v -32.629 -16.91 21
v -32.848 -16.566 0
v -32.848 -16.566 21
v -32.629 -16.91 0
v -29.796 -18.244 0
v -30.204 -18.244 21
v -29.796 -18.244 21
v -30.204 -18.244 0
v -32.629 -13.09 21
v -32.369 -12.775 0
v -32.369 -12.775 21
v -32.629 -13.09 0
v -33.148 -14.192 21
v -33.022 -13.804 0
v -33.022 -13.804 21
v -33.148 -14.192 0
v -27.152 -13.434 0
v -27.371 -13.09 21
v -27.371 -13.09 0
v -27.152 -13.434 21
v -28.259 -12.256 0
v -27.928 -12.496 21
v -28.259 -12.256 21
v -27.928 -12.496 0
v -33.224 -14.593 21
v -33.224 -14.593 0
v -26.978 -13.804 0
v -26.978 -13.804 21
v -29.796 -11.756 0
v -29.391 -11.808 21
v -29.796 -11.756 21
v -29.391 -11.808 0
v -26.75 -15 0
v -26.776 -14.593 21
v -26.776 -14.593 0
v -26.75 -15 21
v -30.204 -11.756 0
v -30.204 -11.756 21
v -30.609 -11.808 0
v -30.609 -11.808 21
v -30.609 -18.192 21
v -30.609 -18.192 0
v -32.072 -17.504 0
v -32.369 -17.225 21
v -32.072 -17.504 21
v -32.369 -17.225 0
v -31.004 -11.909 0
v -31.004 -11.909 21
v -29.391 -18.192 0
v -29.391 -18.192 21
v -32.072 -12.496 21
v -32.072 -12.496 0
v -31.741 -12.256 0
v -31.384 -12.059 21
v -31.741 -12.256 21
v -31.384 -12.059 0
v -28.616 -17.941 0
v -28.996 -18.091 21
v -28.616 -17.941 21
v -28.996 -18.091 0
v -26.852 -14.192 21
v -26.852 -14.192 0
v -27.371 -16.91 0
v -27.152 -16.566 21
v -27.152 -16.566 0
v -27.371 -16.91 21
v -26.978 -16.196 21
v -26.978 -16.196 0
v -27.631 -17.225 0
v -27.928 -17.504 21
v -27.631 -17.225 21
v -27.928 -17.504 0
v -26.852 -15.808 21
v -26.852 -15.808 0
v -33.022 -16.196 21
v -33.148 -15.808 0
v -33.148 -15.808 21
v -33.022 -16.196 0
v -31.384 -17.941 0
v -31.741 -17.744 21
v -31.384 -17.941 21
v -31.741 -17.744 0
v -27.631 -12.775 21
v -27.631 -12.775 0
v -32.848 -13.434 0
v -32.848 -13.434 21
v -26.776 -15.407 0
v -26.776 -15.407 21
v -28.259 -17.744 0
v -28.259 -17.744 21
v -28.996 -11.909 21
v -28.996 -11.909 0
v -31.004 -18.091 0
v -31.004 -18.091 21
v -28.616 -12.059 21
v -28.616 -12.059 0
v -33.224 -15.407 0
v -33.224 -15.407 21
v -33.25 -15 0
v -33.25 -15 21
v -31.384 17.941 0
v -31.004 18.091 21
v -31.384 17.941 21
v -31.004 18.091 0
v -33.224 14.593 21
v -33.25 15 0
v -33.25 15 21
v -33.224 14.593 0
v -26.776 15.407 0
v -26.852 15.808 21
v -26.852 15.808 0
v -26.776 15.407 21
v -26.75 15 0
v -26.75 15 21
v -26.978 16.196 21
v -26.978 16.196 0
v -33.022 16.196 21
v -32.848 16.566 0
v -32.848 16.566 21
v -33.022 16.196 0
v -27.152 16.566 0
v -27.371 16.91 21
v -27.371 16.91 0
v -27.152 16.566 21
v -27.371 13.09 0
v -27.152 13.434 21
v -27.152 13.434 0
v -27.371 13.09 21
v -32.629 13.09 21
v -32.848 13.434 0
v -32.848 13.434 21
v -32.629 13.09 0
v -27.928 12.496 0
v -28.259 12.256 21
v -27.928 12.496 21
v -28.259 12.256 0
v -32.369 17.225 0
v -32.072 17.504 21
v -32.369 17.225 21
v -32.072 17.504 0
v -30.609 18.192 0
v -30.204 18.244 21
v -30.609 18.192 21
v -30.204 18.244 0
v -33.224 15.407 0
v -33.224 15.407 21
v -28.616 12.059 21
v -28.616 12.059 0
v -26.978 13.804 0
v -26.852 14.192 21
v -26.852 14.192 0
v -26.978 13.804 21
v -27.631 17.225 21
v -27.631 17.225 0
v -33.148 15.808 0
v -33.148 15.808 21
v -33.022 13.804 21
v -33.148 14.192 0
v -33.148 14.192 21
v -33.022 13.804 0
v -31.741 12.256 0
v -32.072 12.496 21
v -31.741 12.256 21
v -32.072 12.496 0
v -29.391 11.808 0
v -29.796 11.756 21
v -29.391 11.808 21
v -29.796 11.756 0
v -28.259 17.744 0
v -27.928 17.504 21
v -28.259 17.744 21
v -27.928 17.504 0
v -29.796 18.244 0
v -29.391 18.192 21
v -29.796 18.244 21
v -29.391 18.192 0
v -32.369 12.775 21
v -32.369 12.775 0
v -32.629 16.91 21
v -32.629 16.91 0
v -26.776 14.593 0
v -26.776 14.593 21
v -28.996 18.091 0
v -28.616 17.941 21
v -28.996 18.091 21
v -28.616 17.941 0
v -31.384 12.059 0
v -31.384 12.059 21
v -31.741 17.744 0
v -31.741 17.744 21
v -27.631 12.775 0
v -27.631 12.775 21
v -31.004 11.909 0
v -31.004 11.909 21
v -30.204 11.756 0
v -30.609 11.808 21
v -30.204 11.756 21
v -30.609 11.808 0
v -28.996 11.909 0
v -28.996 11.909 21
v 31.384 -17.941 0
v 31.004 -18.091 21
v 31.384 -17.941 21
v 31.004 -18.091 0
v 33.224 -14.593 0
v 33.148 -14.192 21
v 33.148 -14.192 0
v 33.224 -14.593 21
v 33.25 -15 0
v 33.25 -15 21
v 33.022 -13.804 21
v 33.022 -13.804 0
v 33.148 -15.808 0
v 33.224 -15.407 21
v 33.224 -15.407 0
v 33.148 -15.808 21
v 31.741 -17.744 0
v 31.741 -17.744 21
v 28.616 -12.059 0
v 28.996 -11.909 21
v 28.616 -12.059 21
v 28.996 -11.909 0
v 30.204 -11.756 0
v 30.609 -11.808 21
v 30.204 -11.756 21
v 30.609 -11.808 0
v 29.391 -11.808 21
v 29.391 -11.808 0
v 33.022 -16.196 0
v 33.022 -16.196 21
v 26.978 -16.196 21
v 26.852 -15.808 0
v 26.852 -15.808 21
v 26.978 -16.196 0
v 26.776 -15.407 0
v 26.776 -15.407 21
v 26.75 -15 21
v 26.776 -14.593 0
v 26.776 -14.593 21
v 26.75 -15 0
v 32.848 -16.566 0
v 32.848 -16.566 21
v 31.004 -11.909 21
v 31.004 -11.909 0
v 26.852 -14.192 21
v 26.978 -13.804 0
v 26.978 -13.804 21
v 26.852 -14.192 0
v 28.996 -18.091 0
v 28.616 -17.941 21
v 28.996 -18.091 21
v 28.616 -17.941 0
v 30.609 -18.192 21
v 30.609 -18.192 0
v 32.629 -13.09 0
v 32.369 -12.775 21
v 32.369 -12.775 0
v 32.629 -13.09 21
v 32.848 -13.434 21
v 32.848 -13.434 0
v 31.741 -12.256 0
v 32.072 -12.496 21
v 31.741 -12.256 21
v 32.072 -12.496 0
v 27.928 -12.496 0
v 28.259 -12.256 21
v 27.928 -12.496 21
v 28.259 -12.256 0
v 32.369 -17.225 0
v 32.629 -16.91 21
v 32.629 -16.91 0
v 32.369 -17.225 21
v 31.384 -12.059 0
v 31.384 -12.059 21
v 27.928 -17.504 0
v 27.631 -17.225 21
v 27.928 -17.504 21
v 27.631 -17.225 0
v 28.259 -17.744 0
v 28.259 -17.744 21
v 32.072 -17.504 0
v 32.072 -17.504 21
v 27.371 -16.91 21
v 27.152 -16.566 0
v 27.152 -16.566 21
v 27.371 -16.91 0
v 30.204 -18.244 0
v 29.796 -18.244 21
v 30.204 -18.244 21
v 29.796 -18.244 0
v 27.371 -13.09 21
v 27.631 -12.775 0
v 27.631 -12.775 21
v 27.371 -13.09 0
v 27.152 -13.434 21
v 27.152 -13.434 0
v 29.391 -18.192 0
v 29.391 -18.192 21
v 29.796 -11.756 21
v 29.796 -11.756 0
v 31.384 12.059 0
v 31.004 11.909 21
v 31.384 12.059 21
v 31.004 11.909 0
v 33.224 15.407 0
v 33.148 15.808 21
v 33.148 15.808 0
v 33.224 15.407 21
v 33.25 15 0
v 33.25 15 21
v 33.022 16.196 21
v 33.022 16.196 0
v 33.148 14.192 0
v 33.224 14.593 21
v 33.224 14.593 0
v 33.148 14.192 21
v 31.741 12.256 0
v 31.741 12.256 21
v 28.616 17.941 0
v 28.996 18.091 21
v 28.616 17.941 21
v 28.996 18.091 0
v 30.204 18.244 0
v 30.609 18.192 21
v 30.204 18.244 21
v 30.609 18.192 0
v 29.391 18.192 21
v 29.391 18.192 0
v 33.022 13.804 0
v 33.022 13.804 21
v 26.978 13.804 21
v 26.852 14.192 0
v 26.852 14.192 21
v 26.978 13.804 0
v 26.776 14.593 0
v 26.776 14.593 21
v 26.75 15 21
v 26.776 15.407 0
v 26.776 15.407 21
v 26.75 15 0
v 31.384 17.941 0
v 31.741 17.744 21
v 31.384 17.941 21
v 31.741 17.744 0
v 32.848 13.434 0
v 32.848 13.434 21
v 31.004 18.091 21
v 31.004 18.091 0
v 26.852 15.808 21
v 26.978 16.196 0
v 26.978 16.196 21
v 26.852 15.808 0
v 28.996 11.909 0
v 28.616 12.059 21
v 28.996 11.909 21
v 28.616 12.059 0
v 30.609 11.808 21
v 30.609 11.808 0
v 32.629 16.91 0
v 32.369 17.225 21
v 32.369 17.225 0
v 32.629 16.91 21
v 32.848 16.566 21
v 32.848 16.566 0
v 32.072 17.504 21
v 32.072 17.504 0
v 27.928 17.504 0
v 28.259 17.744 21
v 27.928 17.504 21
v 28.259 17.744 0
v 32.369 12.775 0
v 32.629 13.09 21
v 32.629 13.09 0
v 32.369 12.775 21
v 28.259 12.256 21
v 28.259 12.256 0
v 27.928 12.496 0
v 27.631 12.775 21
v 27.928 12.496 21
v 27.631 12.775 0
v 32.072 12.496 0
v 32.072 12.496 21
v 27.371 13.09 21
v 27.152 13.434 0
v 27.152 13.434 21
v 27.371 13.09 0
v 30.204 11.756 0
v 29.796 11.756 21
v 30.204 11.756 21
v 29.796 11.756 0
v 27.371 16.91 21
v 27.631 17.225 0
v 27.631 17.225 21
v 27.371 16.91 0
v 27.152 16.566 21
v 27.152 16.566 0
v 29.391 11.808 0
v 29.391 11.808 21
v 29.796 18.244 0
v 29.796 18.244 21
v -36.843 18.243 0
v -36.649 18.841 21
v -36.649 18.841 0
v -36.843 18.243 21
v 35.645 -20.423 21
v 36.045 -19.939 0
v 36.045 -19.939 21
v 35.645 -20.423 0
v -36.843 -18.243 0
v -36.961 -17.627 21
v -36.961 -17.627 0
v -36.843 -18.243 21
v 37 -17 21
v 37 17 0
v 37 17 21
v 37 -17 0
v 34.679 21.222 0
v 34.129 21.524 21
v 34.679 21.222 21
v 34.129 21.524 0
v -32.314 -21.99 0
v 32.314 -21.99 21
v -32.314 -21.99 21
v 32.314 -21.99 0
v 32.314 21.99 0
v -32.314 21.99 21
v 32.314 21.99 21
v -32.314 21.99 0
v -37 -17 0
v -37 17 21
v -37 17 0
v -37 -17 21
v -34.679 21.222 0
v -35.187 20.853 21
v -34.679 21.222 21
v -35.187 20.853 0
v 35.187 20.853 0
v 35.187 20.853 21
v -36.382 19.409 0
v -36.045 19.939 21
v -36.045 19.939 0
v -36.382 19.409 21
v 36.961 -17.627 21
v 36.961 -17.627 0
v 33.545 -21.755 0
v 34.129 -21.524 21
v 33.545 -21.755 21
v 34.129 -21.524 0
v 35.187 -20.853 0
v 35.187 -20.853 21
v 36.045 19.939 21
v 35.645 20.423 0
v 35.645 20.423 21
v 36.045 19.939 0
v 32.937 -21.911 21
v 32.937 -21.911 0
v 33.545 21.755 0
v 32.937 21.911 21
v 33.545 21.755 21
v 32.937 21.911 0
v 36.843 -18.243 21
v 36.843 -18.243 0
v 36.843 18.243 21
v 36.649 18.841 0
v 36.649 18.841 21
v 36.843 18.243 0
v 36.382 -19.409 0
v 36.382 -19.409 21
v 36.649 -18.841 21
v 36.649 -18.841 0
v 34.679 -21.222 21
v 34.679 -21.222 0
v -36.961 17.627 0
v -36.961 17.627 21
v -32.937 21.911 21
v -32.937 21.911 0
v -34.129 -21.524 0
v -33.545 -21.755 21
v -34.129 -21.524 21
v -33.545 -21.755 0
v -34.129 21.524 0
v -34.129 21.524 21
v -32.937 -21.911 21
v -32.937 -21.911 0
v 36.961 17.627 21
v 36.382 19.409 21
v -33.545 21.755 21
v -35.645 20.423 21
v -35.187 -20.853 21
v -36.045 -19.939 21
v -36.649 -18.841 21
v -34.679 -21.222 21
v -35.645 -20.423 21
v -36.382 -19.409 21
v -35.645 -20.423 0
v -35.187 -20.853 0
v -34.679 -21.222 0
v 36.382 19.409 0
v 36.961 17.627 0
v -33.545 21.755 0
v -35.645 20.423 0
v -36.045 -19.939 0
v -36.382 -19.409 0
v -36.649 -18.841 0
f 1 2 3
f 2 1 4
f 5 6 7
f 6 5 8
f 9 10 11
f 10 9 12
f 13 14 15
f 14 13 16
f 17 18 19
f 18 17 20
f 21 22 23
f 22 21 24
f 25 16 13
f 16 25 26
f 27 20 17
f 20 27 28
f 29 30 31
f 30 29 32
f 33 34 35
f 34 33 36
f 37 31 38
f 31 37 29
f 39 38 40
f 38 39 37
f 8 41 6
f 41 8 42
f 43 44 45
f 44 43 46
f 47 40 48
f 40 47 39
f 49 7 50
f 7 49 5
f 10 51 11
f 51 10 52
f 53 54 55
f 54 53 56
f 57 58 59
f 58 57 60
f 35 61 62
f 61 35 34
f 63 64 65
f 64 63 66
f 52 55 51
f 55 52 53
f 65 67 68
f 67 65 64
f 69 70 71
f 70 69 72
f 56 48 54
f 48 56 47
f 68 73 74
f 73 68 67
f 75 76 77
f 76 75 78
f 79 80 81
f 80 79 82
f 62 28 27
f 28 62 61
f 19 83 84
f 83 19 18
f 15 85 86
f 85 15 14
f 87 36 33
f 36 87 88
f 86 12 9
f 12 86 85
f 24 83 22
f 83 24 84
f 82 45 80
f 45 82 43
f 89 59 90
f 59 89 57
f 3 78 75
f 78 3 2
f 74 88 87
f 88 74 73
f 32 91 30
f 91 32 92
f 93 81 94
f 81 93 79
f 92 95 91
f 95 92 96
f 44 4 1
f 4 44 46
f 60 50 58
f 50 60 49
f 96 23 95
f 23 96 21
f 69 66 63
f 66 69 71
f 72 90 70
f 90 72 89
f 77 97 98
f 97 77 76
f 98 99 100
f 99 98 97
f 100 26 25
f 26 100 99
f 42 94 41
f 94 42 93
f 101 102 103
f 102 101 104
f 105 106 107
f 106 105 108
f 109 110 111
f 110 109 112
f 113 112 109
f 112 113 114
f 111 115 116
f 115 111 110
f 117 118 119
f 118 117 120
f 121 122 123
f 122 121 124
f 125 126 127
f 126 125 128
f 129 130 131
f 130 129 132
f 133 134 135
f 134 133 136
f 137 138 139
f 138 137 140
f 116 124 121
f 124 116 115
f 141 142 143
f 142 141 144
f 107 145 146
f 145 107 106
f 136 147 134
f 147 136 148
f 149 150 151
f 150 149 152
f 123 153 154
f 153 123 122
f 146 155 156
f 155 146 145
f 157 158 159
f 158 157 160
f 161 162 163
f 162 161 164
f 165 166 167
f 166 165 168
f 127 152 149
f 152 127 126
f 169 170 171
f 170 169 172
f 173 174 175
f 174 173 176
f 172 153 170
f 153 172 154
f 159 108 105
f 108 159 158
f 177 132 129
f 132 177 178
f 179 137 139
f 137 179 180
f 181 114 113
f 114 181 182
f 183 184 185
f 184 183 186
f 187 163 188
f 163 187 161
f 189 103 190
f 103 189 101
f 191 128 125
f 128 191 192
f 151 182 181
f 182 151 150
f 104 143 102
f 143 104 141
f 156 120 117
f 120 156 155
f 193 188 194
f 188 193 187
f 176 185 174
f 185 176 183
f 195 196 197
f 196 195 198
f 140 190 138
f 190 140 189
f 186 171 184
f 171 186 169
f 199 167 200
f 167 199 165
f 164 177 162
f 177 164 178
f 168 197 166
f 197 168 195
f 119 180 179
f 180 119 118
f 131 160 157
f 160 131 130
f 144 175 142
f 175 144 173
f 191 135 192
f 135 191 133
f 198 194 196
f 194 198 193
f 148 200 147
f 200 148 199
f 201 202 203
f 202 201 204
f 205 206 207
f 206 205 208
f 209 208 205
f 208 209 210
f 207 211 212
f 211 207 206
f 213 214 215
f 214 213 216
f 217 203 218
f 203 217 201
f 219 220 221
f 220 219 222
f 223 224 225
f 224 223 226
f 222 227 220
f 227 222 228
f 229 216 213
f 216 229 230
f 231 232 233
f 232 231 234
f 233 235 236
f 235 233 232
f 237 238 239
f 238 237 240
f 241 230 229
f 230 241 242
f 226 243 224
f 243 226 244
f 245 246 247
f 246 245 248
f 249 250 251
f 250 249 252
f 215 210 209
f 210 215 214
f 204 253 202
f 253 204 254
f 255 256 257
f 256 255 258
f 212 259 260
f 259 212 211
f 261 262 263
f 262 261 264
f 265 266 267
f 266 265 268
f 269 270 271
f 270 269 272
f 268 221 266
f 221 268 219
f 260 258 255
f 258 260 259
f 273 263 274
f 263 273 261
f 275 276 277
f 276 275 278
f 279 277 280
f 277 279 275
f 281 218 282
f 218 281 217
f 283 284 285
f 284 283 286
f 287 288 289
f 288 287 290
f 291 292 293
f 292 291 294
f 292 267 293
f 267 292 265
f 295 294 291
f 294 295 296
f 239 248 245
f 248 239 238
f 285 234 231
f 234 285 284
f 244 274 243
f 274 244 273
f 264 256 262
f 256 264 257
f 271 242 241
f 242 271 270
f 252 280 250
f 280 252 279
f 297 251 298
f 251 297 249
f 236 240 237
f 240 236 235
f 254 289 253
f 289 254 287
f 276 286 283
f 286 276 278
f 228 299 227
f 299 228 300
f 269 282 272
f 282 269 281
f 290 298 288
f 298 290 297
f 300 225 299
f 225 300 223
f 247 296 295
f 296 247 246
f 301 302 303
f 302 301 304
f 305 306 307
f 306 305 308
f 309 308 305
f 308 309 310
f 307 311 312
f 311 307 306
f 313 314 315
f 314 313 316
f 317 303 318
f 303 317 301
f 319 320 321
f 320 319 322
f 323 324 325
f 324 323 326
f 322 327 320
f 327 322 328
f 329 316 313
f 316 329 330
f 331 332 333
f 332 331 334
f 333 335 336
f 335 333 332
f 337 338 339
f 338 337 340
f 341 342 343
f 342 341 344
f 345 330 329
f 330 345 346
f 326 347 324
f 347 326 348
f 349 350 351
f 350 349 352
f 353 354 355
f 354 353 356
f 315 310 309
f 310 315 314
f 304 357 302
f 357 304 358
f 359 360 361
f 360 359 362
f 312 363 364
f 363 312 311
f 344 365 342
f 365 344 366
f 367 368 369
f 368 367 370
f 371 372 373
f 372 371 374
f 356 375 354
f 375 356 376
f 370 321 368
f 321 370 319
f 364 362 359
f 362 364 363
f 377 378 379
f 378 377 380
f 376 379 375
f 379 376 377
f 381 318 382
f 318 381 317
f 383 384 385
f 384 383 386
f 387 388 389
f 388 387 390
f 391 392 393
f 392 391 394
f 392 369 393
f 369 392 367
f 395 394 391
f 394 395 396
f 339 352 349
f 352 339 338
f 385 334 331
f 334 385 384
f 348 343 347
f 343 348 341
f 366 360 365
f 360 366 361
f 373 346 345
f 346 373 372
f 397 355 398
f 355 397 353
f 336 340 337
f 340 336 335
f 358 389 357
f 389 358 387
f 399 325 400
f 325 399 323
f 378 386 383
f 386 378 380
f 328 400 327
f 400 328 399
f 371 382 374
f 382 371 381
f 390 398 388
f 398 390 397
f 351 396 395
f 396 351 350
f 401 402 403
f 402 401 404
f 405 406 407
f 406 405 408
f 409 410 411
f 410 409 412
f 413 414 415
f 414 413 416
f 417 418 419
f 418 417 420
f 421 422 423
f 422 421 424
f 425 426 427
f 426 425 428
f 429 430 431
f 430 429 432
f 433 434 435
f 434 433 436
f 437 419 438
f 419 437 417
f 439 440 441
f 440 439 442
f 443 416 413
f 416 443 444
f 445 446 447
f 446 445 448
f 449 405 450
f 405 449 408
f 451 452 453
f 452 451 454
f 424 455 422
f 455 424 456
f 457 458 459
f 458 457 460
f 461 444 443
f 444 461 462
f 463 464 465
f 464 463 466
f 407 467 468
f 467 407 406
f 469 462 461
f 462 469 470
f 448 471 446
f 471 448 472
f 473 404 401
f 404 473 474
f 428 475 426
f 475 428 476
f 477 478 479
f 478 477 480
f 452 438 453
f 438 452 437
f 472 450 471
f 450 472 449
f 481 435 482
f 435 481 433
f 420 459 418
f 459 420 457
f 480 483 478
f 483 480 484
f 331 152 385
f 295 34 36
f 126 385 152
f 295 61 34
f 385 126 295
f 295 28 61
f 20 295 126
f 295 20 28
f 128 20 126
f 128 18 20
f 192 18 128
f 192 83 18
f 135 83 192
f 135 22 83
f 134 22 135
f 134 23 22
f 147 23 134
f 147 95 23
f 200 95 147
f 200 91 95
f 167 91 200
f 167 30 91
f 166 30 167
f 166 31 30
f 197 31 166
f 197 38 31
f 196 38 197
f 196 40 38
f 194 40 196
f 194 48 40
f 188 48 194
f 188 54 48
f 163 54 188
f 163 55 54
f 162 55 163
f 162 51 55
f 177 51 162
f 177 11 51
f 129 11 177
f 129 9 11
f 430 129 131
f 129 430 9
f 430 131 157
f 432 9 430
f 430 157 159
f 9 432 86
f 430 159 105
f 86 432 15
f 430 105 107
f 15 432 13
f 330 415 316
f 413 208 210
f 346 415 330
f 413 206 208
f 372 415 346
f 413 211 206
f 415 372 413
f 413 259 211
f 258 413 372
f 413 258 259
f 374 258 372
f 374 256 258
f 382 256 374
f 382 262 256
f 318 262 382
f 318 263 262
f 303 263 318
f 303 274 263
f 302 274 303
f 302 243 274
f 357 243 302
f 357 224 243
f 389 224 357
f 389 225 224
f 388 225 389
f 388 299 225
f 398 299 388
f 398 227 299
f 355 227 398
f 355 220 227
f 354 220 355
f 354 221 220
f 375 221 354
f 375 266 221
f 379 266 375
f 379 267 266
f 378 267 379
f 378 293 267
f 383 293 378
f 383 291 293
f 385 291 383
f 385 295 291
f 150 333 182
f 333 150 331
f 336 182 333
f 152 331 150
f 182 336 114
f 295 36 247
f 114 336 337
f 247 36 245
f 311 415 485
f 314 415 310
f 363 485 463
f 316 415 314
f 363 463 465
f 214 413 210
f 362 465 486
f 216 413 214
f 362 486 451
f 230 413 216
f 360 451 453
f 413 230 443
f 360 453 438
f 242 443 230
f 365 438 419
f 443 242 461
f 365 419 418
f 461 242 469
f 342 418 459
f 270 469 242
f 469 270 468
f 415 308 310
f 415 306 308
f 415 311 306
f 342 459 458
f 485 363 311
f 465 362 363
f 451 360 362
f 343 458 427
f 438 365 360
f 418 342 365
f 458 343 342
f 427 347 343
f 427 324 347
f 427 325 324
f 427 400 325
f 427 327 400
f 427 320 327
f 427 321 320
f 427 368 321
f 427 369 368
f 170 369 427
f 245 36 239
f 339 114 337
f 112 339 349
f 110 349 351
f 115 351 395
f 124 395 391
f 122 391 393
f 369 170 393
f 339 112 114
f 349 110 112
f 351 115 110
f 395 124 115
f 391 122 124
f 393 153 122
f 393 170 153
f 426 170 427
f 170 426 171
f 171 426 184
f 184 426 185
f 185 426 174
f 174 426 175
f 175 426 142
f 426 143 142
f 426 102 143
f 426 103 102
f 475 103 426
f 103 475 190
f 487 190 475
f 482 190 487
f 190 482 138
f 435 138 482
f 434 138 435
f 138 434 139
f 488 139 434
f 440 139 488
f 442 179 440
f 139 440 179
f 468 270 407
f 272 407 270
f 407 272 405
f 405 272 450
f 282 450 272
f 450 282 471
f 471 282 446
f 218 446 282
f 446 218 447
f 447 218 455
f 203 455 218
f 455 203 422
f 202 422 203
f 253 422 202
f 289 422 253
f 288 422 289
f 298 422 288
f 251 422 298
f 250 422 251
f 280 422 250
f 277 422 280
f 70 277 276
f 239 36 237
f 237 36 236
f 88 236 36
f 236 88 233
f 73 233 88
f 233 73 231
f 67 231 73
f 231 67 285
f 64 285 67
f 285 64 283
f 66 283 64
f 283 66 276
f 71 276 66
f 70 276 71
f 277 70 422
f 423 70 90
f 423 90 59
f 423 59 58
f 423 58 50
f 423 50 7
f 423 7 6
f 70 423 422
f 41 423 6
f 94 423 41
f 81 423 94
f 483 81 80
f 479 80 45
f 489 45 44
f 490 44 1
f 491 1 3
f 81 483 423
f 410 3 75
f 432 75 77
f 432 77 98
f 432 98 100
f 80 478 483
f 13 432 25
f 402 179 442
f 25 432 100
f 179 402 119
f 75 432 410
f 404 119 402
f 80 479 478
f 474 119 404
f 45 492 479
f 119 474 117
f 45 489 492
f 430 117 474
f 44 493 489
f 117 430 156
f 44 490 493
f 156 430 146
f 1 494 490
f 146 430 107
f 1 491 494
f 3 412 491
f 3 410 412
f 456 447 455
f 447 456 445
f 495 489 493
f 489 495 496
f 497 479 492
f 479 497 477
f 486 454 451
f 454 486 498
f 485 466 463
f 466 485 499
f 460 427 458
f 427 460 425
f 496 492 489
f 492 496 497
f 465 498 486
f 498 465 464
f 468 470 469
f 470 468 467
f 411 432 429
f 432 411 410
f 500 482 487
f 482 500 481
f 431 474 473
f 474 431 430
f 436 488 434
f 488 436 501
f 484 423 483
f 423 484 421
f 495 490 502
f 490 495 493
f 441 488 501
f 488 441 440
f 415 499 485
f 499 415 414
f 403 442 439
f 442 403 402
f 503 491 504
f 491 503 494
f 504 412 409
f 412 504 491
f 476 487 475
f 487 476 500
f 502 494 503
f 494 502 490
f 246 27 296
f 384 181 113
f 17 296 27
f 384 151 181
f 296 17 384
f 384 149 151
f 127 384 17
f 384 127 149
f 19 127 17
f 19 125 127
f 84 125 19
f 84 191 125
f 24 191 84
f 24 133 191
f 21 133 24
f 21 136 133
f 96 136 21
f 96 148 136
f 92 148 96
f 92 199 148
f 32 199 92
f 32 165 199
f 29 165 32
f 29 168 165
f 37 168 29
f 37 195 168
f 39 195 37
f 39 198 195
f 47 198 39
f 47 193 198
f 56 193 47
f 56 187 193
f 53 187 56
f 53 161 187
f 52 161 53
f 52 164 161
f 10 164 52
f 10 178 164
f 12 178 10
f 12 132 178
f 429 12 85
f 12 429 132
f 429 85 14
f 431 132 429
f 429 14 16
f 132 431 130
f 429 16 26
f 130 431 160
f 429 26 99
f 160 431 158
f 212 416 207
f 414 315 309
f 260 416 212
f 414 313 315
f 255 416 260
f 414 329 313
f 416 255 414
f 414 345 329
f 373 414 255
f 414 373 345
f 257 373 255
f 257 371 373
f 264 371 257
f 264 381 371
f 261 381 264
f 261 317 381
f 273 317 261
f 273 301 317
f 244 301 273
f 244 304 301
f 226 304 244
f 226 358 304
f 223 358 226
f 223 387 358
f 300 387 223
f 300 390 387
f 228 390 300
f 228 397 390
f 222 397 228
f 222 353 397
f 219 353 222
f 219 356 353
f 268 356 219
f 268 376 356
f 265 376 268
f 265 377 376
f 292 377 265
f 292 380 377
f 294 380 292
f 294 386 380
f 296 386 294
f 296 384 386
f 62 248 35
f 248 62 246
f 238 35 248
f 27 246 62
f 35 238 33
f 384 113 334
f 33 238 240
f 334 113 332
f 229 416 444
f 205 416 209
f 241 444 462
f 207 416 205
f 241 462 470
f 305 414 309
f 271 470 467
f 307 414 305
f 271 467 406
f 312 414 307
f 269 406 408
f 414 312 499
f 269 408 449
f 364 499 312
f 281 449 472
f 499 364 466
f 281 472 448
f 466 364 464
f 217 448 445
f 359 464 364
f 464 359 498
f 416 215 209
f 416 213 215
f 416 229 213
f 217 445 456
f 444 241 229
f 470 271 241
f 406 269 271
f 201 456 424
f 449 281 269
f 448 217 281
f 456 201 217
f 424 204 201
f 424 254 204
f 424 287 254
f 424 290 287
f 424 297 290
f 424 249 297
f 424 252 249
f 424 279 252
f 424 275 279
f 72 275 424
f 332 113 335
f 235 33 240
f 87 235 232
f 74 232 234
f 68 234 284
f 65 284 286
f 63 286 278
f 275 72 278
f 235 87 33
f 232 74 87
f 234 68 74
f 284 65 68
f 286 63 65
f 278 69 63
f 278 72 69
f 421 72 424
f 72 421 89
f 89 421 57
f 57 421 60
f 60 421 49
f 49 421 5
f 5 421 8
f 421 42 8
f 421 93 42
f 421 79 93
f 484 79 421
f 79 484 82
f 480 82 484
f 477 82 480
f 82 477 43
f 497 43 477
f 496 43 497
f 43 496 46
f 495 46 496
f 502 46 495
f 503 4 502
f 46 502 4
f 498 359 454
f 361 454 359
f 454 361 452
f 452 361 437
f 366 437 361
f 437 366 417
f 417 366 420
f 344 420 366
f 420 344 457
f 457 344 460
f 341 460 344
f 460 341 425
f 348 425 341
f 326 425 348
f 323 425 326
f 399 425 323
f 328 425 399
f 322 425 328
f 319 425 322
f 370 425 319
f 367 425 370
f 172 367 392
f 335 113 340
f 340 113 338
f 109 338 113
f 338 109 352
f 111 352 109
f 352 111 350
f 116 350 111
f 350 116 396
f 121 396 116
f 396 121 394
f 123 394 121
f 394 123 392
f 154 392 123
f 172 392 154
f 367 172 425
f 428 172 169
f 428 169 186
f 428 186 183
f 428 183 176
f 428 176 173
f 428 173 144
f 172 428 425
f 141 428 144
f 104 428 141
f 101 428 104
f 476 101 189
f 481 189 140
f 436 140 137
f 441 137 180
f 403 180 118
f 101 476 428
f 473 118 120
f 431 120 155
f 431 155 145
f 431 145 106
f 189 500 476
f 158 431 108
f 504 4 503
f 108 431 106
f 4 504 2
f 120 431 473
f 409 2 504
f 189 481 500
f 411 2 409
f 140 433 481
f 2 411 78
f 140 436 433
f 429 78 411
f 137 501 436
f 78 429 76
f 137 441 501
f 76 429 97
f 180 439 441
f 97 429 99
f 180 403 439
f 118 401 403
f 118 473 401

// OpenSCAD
$fn = 50;


difference() {
	union() {
		hull() {
			translate(v = [-32.0000000000, 17.0000000000, 0]) {
				cylinder(h = 21, r = 5);
			}
			translate(v = [32.0000000000, 17.0000000000, 0]) {
				cylinder(h = 21, r = 5);
			}
			translate(v = [-32.0000000000, -17.0000000000, 0]) {
				cylinder(h = 21, r = 5);
			}
			translate(v = [32.0000000000, -17.0000000000, 0]) {
				cylinder(h = 21, r = 5);
			}
		}
	}
	union() {
		translate(v = [-30.0000000000, -15.0000000000, -100.0000000000]) {
			cylinder(h = 200, r = 3.2500000000);
		}
		translate(v = [-30.0000000000, 15.0000000000, -100.0000000000]) {
			cylinder(h = 200, r = 3.2500000000);
		}
		translate(v = [30.0000000000, -15.0000000000, -100.0000000000]) {
			cylinder(h = 200, r = 3.2500000000);
		}
		translate(v = [30.0000000000, 15.0000000000, -100.0000000000]) {
			cylinder(h = 200, r = 3.2500000000);
		}
	}
}
